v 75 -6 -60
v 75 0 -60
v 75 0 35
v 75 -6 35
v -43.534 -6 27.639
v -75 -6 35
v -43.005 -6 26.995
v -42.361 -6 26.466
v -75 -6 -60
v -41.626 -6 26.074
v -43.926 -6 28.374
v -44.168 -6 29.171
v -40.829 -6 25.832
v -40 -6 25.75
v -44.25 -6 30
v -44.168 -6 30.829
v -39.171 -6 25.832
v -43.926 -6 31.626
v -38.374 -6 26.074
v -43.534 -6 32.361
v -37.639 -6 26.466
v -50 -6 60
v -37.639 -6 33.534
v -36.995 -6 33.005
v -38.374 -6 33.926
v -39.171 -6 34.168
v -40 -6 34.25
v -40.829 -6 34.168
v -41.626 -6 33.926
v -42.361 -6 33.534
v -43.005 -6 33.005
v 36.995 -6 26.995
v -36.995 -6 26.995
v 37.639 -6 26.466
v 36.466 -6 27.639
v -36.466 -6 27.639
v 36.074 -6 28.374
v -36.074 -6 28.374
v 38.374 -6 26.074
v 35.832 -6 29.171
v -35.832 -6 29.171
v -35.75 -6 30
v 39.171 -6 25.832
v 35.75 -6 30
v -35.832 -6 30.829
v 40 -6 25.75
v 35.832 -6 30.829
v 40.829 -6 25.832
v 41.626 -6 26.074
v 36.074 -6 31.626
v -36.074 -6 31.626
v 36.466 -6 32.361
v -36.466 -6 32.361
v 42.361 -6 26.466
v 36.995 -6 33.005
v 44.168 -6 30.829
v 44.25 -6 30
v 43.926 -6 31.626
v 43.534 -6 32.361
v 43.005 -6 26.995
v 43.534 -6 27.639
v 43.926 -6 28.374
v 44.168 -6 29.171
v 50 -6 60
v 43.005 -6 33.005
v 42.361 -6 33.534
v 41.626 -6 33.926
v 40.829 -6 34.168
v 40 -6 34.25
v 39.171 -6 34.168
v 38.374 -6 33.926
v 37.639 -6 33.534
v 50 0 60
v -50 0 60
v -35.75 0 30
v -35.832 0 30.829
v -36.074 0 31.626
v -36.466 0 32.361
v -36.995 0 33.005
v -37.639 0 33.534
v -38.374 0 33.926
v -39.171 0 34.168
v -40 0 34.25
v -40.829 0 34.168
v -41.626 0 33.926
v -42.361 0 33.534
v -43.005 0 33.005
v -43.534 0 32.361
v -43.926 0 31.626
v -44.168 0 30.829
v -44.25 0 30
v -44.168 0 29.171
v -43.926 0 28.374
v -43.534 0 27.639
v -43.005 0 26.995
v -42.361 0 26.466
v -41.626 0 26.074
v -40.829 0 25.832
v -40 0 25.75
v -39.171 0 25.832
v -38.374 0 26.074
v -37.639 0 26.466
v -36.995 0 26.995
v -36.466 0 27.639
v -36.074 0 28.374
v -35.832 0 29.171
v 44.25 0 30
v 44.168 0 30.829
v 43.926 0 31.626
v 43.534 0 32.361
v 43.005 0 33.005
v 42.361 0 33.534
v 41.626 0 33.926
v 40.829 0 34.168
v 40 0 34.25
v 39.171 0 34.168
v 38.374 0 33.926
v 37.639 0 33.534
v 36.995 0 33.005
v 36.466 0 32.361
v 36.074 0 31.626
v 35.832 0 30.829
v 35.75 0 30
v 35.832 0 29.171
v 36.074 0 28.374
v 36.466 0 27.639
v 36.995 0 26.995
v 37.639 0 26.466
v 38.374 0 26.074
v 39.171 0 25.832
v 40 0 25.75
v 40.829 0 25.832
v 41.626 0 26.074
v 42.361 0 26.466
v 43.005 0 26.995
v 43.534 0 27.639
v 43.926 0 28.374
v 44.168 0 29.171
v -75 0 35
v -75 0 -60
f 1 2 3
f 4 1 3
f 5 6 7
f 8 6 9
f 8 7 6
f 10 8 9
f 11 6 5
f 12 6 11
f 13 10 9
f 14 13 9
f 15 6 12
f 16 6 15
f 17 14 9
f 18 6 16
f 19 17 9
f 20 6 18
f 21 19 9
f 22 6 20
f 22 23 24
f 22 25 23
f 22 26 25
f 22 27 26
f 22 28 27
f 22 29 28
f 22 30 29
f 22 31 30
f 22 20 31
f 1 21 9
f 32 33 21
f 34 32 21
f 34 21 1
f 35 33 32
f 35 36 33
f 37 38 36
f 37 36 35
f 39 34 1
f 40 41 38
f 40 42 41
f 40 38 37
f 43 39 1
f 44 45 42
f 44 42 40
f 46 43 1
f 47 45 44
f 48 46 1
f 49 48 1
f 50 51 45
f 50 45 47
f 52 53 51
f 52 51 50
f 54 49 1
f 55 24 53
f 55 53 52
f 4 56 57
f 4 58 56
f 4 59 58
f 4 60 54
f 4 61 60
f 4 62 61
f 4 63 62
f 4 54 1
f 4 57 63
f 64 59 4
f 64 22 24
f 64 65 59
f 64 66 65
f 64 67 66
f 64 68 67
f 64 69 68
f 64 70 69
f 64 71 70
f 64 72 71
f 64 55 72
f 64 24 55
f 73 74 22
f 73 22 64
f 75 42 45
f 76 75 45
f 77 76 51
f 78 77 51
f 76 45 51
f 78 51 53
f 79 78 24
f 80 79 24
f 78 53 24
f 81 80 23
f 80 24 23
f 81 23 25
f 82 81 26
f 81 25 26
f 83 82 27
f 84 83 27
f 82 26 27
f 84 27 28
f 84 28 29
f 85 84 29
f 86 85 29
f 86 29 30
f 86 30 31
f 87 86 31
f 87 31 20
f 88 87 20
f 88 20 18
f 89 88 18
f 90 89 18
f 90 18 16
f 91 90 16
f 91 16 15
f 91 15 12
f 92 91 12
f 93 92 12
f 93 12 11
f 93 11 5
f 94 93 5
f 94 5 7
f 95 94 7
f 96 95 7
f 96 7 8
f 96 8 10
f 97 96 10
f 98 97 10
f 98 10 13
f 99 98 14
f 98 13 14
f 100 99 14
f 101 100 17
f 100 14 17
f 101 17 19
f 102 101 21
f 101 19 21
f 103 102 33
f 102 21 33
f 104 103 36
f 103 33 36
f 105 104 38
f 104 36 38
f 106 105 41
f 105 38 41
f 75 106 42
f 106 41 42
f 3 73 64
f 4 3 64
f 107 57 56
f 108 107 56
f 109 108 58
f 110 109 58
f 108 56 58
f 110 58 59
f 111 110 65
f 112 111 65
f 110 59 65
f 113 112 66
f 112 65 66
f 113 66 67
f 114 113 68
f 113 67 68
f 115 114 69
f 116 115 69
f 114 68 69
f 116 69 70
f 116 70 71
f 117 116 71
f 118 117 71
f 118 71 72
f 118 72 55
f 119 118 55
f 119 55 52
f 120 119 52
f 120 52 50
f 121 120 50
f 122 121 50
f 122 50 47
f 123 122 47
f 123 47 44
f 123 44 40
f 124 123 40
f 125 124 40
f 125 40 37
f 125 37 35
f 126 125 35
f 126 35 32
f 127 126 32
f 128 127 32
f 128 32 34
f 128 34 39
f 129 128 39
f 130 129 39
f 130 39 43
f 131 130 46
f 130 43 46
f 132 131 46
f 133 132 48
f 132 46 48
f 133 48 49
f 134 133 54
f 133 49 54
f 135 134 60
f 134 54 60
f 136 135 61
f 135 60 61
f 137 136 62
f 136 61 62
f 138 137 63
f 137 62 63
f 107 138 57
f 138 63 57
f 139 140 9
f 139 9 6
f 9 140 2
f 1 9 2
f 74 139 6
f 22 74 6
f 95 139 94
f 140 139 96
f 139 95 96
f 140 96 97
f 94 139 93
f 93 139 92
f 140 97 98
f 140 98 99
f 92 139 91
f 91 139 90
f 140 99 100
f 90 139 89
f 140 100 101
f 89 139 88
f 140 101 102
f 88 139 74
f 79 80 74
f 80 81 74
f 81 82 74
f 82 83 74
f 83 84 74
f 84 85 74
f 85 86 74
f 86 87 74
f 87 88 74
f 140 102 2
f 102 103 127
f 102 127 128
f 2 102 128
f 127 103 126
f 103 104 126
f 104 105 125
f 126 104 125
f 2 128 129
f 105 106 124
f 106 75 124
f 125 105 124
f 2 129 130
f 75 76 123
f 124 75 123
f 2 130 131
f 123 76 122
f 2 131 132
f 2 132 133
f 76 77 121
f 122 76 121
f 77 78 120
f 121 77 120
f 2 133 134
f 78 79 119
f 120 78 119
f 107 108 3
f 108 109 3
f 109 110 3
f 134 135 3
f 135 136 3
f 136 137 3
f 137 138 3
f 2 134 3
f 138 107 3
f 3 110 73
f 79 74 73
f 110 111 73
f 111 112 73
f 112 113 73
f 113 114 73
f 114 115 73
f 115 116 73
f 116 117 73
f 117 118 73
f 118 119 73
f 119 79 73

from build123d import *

# Parameters (mm, degrees)
F0_W     = 150
F0_H     = 120
F1_DEPTH = 6
F2_R     = 4.25
F3_DEPTH = 25
F4_SIZE  = 25


with BuildPart() as f1:
    # F0 (on Front) → F1 (new body)
    with BuildSketch(Plane.XZ):
        Rectangle(F0_W, F0_H)
    extrude(amount=F1_DEPTH)

    # F2 (on face) → F3 (cut)
    with BuildSketch(Plane.XZ.offset(6)):
        with Locations((-40, 30)):
            Circle(F2_R)
        with Locations((40, 30)):
            Circle(F2_R)
    extrude(amount=-F3_DEPTH, mode=Mode.SUBTRACT)

    # F4
    f4_edges = [f1.edges().sort_by_distance(p)[0] for p in [
        (-75, -3, 60),
        (75, -3, 60),
    ]]
    chamfer(f4_edges, length=F4_SIZE)


solid = f1.part
